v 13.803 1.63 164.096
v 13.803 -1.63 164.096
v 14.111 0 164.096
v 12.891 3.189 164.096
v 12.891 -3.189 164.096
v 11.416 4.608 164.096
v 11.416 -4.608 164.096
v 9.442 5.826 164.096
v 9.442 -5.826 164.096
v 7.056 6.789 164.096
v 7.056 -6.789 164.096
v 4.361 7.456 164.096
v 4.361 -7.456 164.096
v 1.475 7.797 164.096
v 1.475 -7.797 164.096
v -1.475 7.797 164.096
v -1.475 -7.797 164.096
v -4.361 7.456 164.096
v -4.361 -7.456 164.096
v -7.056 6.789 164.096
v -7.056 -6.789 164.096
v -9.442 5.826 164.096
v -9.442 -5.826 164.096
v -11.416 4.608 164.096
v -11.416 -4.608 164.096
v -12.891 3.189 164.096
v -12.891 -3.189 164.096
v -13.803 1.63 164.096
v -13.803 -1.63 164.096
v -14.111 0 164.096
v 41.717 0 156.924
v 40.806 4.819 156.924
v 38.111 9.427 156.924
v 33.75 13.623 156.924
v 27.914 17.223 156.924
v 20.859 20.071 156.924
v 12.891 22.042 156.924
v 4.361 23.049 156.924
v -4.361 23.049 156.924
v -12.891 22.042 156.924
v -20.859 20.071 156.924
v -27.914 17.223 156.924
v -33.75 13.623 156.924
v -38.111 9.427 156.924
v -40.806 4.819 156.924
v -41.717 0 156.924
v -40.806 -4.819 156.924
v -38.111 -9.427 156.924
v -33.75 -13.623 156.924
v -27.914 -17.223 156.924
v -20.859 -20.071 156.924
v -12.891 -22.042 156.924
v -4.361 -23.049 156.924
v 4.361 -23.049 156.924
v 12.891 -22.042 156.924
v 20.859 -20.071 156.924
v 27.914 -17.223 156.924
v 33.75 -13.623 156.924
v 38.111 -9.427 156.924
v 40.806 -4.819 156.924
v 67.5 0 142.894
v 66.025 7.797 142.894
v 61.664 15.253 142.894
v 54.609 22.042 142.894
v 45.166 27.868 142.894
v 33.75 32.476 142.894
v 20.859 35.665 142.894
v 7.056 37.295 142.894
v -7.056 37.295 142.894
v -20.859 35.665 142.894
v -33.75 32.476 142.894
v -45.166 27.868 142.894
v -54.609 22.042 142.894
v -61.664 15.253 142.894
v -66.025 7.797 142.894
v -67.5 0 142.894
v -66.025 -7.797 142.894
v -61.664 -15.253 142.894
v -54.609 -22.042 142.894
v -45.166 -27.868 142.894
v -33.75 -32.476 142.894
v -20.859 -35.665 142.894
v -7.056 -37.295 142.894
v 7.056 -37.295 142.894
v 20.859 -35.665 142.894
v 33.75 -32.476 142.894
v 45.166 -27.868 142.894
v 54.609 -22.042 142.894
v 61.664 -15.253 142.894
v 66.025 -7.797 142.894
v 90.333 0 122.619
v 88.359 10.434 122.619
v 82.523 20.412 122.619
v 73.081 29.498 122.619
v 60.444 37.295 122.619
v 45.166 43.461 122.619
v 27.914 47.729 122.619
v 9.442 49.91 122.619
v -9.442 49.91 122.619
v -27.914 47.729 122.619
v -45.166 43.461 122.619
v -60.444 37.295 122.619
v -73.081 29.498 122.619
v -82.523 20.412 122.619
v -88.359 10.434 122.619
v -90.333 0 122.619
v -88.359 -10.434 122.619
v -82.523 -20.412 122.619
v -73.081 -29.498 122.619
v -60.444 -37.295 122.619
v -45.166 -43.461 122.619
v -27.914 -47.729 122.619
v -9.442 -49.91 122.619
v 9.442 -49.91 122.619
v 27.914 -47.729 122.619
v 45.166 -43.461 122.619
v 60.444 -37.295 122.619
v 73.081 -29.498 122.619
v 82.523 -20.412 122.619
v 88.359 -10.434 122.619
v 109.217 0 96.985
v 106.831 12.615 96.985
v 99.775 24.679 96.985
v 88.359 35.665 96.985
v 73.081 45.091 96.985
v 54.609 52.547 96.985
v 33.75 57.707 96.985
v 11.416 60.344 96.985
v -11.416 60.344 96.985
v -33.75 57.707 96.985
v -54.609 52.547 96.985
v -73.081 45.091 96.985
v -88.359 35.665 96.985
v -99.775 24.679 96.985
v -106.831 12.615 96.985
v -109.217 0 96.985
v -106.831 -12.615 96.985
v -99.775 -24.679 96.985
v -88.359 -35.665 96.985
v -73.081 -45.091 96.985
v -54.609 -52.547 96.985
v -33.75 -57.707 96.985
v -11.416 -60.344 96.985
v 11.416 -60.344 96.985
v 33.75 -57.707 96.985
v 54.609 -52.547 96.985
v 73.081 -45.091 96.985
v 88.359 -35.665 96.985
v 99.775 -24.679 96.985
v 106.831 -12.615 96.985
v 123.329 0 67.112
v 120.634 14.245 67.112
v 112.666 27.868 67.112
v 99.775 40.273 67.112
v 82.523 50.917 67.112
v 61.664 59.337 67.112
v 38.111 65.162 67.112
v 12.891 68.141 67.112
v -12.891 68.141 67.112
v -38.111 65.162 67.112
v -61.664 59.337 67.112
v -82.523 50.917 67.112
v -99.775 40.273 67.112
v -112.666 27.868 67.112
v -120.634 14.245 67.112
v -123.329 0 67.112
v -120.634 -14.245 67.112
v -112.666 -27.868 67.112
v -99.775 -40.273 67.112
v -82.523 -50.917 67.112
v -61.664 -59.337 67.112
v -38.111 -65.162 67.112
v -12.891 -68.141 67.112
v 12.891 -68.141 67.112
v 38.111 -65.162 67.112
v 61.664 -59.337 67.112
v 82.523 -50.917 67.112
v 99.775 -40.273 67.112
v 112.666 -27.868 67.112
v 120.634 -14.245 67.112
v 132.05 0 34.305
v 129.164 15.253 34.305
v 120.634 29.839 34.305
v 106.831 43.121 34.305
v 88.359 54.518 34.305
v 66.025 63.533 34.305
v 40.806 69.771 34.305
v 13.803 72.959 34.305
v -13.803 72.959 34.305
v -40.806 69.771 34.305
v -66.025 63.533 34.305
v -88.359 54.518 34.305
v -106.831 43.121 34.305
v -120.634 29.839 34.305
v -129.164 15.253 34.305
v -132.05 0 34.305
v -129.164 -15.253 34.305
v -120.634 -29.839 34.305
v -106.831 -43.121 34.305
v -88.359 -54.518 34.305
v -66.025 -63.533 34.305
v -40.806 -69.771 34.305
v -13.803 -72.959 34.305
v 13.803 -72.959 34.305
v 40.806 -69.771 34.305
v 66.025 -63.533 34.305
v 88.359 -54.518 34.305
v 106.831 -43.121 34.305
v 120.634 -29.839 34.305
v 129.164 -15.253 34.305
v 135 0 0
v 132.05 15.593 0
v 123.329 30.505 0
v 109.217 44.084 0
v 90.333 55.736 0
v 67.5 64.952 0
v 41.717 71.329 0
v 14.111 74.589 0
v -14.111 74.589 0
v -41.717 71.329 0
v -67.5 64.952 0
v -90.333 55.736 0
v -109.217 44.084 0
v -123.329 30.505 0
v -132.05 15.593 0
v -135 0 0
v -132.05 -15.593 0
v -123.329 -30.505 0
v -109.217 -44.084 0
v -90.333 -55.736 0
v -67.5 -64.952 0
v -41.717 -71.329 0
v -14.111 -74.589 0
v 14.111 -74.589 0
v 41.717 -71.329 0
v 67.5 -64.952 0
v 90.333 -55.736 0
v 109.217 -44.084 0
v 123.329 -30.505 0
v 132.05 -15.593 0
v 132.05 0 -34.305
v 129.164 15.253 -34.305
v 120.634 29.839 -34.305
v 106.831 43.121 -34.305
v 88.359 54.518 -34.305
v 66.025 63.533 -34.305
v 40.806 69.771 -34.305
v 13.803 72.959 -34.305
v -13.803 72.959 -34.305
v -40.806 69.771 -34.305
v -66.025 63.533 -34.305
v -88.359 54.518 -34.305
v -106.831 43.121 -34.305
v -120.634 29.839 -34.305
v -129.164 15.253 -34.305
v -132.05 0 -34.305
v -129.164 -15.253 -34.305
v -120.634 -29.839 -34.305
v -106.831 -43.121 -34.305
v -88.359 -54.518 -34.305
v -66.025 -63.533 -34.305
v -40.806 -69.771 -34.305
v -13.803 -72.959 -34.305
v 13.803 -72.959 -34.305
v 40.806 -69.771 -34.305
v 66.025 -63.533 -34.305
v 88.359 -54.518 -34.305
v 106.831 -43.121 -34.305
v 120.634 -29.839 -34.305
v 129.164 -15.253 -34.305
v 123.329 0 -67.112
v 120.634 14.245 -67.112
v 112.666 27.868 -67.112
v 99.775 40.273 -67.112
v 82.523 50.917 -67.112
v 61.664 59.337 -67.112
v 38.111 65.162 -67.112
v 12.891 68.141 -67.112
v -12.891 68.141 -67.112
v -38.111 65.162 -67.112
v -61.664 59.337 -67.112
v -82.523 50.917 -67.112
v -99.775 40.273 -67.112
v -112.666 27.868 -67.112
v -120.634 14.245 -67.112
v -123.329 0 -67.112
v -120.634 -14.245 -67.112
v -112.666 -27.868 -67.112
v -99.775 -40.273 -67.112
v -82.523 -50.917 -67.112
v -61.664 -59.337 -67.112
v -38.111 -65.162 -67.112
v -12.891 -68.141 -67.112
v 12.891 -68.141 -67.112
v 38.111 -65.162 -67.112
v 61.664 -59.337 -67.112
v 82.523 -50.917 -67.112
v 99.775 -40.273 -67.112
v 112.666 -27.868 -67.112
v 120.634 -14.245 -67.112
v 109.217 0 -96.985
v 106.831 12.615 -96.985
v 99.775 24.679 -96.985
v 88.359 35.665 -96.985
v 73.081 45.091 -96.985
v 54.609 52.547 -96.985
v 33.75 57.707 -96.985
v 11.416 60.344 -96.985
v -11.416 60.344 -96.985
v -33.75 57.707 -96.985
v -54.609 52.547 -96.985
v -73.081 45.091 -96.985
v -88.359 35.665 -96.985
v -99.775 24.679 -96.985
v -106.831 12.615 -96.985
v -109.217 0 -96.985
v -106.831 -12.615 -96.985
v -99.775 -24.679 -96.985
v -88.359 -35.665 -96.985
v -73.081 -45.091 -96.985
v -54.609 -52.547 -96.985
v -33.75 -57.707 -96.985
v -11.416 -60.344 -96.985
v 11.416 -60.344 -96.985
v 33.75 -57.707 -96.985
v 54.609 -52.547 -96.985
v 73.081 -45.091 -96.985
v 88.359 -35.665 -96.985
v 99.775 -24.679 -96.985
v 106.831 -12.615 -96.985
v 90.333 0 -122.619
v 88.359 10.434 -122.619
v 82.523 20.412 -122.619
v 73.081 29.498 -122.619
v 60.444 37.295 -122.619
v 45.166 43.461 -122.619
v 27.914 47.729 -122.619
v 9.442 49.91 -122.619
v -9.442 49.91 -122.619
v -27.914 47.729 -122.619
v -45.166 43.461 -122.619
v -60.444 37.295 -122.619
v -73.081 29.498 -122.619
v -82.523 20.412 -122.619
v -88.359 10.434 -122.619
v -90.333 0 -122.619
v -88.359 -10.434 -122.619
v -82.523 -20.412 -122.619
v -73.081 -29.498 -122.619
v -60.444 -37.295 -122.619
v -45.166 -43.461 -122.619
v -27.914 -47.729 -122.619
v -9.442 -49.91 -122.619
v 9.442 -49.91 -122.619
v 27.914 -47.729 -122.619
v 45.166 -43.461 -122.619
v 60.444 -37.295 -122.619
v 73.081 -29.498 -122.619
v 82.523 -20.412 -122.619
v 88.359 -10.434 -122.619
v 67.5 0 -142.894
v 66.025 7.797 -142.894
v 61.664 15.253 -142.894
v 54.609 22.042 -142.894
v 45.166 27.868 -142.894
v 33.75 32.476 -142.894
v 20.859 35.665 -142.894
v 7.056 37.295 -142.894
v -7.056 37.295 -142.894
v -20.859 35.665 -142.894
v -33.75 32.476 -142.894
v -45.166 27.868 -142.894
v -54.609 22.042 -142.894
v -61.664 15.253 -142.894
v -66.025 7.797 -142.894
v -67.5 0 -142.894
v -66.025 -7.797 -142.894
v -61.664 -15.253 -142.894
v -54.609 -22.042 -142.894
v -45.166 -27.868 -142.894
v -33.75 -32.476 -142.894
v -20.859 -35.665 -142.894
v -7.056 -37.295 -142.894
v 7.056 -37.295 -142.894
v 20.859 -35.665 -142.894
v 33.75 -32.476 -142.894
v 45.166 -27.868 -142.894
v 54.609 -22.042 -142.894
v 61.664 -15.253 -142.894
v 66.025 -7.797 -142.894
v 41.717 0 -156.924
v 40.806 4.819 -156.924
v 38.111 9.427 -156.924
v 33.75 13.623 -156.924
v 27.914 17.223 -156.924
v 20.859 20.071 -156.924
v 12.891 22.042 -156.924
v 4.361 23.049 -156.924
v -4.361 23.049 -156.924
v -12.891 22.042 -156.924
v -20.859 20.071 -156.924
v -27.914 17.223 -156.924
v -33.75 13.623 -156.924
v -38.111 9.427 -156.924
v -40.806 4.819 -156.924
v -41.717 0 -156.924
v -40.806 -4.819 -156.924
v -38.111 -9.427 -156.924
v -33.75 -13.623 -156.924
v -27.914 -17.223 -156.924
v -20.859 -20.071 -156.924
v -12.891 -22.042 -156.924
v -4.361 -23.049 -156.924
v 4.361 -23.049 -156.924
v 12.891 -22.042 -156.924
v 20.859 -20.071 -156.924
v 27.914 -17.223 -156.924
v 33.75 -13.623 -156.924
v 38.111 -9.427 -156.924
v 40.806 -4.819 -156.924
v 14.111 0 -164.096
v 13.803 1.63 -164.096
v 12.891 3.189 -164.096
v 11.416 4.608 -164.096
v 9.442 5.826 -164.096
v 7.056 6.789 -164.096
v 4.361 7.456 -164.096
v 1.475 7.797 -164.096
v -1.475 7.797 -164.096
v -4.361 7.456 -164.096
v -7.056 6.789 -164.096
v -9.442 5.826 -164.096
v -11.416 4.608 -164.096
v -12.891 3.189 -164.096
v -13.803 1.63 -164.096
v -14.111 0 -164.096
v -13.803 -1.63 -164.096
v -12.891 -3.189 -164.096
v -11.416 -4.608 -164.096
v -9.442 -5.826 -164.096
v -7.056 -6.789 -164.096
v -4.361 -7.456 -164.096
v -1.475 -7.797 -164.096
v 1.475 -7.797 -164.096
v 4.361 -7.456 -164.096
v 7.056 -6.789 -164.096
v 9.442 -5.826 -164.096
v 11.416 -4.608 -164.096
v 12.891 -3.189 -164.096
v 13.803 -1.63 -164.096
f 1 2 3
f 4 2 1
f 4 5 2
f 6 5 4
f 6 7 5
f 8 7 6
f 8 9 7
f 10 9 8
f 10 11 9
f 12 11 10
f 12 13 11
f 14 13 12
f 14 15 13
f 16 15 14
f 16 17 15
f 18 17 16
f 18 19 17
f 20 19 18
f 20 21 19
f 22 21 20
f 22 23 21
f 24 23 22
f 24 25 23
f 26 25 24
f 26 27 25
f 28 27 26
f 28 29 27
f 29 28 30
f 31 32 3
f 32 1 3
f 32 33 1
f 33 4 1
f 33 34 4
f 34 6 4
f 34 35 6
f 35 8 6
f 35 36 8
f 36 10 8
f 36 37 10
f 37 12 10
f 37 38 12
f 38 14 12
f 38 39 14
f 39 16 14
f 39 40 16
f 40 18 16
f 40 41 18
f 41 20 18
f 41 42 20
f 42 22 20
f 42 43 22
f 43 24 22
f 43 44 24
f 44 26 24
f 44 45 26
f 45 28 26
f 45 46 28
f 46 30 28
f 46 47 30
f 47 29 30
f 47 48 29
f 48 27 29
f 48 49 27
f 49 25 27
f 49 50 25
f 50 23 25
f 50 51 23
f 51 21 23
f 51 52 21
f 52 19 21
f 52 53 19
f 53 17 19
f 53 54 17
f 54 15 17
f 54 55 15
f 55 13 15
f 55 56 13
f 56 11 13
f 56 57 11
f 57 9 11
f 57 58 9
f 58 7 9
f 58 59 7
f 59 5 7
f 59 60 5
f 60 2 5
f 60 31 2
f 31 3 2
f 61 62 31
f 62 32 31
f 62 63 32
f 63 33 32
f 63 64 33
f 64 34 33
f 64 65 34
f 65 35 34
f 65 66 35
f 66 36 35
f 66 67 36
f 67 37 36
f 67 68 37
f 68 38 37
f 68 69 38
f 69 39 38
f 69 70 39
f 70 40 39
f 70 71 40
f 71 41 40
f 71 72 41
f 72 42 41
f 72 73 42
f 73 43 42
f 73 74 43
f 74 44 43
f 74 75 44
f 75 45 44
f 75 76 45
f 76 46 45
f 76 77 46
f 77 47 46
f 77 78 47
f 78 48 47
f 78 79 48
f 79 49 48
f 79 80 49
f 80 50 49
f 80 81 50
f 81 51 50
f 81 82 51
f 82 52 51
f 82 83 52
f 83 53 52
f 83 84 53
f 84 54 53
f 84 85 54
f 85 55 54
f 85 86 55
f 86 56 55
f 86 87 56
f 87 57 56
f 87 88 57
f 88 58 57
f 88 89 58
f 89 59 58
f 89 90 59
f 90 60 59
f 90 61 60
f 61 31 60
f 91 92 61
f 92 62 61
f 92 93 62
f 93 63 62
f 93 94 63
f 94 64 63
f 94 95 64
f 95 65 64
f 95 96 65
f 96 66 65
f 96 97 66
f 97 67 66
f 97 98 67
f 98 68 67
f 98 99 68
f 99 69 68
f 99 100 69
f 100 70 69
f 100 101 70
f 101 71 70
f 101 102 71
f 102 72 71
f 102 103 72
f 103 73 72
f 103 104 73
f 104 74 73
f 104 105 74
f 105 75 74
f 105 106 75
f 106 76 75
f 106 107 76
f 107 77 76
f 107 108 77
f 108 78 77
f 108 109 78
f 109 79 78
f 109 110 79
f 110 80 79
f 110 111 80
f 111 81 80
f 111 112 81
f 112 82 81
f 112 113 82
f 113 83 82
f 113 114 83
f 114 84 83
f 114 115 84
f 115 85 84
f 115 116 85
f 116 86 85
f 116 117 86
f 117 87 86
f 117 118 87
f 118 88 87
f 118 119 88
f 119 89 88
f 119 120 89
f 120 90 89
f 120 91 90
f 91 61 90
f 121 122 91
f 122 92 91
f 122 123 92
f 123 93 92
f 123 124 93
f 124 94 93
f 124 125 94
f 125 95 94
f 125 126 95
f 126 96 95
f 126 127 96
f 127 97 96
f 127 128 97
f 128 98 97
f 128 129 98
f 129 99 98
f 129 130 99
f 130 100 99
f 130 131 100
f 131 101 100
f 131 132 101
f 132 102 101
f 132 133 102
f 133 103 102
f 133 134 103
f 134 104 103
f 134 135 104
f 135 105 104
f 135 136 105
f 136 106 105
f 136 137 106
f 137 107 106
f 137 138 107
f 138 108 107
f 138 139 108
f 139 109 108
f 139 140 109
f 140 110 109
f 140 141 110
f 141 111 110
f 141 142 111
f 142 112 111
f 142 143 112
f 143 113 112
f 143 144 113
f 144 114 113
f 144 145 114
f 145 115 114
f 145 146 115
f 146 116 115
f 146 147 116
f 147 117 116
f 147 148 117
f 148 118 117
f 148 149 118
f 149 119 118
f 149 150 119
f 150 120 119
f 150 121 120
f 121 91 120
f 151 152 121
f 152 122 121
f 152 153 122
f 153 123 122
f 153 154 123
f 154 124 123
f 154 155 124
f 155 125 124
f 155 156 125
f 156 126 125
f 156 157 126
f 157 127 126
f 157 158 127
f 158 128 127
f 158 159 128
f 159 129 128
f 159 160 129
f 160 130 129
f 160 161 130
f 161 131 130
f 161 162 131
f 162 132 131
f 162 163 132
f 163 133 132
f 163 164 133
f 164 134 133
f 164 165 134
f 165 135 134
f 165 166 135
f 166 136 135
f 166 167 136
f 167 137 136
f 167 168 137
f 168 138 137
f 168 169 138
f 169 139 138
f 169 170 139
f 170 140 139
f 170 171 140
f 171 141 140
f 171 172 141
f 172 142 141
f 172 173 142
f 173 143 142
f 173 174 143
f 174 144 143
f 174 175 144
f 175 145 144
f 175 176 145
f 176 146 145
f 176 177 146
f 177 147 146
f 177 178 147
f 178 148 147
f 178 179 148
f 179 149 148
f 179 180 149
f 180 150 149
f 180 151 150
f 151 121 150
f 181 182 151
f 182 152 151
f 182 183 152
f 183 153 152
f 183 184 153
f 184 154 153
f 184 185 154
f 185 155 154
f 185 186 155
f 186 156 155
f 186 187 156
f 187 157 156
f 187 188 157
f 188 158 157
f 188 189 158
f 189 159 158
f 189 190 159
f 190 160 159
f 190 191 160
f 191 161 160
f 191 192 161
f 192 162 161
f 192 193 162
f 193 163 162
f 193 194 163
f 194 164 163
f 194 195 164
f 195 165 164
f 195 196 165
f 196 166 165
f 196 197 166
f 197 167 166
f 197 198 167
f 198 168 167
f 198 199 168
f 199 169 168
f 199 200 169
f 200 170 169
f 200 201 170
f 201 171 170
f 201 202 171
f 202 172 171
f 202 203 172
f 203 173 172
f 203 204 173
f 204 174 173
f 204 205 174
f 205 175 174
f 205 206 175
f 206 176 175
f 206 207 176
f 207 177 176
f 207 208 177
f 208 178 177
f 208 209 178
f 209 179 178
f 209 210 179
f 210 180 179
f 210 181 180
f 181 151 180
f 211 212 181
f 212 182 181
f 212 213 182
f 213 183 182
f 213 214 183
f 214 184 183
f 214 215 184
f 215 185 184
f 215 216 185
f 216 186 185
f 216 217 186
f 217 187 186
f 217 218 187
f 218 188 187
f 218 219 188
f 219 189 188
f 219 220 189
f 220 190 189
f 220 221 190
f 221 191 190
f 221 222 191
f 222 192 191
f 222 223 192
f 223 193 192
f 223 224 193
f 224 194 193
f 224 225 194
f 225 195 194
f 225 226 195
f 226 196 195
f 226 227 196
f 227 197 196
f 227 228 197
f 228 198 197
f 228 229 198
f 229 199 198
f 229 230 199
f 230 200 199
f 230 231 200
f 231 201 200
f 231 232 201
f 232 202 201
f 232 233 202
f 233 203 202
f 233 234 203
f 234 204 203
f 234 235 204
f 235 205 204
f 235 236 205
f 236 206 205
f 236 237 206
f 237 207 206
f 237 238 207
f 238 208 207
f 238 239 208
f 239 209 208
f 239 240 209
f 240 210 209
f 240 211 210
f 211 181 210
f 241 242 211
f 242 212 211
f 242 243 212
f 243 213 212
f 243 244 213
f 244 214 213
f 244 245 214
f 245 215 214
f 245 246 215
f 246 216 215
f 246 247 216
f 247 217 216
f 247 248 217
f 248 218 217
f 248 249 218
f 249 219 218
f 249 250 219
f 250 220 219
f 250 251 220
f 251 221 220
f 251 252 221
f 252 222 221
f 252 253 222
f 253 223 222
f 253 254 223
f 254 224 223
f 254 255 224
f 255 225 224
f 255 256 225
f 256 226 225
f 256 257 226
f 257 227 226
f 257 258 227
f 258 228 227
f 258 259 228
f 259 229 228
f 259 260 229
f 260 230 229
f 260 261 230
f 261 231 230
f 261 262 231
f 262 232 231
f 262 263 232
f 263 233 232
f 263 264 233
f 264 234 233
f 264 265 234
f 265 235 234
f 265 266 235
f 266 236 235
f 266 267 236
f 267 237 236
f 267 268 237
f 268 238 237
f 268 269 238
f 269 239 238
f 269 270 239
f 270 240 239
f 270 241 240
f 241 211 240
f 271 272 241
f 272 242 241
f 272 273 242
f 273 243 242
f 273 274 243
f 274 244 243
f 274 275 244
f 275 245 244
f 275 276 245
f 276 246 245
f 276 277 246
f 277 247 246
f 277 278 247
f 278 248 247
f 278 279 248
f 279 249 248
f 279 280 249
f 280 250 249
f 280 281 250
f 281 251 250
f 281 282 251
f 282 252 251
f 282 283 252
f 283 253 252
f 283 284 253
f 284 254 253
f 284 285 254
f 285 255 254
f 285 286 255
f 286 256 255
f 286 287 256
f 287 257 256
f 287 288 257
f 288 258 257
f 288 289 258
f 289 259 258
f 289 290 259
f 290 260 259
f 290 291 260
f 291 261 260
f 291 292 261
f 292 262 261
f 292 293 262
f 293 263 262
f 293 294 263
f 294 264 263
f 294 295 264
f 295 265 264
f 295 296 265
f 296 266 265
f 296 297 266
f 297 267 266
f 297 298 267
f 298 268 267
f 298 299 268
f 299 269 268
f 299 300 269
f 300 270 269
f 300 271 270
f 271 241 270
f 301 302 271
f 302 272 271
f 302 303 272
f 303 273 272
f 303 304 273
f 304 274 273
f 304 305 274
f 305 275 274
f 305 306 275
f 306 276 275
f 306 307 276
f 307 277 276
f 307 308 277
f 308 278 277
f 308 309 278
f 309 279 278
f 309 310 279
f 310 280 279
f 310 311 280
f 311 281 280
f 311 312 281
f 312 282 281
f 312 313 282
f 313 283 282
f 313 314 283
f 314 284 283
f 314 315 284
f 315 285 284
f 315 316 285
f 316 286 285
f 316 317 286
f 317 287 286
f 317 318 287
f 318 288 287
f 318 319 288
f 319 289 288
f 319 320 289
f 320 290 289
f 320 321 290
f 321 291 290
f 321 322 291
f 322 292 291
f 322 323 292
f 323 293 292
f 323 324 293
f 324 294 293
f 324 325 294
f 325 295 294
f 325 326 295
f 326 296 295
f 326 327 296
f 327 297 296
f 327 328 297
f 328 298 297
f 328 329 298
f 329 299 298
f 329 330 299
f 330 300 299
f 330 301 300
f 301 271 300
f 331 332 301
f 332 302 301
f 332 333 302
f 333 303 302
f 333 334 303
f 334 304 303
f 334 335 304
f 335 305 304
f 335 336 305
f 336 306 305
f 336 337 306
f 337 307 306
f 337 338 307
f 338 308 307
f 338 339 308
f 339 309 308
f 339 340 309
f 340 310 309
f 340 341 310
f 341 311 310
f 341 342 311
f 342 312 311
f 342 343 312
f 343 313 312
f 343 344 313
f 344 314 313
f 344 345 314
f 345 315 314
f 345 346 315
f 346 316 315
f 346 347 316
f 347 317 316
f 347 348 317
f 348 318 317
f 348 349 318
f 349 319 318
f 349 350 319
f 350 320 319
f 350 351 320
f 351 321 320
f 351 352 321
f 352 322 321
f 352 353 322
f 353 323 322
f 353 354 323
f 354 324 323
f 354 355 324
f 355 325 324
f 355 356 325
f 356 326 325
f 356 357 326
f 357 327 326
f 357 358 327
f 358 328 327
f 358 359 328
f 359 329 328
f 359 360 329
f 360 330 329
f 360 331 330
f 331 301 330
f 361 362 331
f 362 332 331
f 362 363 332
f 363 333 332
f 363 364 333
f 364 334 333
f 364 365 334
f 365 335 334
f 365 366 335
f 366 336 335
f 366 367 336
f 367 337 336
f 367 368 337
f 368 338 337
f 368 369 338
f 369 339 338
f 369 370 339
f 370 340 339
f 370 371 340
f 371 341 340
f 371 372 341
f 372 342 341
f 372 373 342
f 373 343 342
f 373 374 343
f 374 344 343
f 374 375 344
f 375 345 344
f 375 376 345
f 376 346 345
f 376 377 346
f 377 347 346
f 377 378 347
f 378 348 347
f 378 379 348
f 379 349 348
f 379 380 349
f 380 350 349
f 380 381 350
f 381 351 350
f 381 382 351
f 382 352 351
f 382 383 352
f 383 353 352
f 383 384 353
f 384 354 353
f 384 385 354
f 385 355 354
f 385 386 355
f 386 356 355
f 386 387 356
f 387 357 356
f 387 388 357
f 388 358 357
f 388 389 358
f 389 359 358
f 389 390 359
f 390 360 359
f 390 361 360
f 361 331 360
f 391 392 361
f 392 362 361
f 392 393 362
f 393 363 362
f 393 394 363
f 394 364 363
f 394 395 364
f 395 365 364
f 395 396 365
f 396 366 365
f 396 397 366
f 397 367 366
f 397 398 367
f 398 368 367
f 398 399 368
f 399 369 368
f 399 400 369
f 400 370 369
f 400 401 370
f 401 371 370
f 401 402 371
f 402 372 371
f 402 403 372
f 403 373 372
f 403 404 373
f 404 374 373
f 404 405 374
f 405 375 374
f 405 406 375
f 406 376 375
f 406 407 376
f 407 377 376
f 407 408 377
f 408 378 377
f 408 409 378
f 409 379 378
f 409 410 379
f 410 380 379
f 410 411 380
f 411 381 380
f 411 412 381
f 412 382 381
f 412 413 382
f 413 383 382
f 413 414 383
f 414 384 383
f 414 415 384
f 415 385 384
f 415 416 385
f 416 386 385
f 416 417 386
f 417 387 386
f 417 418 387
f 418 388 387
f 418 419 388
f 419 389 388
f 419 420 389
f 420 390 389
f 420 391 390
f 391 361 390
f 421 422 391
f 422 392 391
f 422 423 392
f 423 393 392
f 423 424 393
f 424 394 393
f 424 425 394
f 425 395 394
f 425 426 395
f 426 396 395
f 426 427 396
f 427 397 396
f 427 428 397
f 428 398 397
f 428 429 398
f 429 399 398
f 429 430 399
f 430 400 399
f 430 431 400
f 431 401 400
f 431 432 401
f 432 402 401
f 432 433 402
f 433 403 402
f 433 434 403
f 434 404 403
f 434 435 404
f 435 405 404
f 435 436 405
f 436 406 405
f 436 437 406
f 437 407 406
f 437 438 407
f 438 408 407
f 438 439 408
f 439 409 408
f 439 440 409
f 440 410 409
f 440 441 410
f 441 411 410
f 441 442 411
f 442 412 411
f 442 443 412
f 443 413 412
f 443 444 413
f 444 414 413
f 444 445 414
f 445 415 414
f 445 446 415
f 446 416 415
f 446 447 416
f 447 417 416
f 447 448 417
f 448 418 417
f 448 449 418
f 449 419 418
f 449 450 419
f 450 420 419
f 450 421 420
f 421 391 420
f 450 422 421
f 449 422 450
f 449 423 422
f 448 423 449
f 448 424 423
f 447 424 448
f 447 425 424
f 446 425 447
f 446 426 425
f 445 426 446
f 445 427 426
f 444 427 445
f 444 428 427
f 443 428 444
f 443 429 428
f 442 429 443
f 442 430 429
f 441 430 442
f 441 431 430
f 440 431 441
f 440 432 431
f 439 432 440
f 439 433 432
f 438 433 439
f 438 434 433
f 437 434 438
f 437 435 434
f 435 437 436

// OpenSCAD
// Generated by SolidPython 1.0.1 on 2020-07-29 00:46:48


scale(v = [9, 5, 11]) {
	sphere(r = 15);
}
/***********************************************
*********      SolidPython code:      **********
************************************************
 
# import packages: SolidPython
from solid import *
from solid.utils import *
from itertools import chain, combinations, permutations


class Resize:

    def __init__(self, scad_file):
        self.scad_file = scad_file
        #self.scad_file = import_scad(scad_file)
        # cone/cylinder param:
        self.r1 = 0
        self.r2 = 0
        self.h = 0
        # rectangular prism param:
        self.w = 0
        self.l = 0
        # ellipse param:
        self.r = 0

    # import OpenScad code (file name corresponds to shape)


    # classify shape + parameters
    def assign(self, param1, param2, param3):
        if self.scad_file == 'cone.scad':
            self.r1 = param1
            self.r2 = param2
            self.h = param3
        elif self.scad_file == 'cylinder.scad':
            self.r1 = param1
            self.r2 = param2
            self.h = param3
        elif self.scad_file == 'rectangularPrism.scad':
            self.h = param1
            self.l = param2
            self.w = param3
        else:
            self.r = param1
            self.h = param2

    # resize parameters
    def iterate(self):
        x = range(3, 20, 2)
        i = 1
        if self.scad_file == 'cone.scad':
            tempList = list(permutations(x, 2))
            for temp in tempList:
                param1 = temp[0]
                param2 = temp[1]
                filepath = 'produced_scad_files/' + 'cone' + str(param1) + '_' + str(param2) + '_' + '.scad'
                scad_render_to_file(cylinder(h=param1, r1=param2, r2=0), filepath)

        elif self.scad_file == 'cylinder.scad':
            tempList = list(permutations(x, 3))
            for temp in tempList:
                param1 = temp[0]
                param2 = temp[1]
                filepath = 'produced_scad_files/' + 'cylinder' + str(param1) + '_' + str(param2) + '_' + '.scad'
                scad_render_to_file(cylinder(h=param1, r1=param2, r2=param2), filepath)

        elif self.scad_file == 'rectangularPrism.scad':
            tempList = list(permutations(x, 3))
            for temp in tempList:
                param1 = temp[0]
                param2 = temp[1]
                param3 = temp[2]
                filepath = 'produced_scad_files/' + 'rectangularPrism' + str(param1) + '_' + str(param2) + '_' + str(
                    param3) + '.scad'
                scad_render_to_file(cube(size=(param1, param2, param3)), filepath)

        elif self.scad_file == 'ellipse.scad':
            tempList = list(permutations(x, 4))
            for temp in tempList:
                param1 = temp[0]
                param2 = temp[1]
                param3 = temp[2]
                param4 = temp[3]
                filepath = 'produced_scad_files/' + 'ellipse' + str(param1) + '_' + str(param2) + '_' + str(param3) + '_' + str(param4) + '.scad'
                scad_render_to_file(scale([param1, param2, param3])(sphere(r=param4)), filepath)

    def render_to_scadfile(self):
        scad_render_to_file(scad, 'example.scad') 
 
************************************************/
